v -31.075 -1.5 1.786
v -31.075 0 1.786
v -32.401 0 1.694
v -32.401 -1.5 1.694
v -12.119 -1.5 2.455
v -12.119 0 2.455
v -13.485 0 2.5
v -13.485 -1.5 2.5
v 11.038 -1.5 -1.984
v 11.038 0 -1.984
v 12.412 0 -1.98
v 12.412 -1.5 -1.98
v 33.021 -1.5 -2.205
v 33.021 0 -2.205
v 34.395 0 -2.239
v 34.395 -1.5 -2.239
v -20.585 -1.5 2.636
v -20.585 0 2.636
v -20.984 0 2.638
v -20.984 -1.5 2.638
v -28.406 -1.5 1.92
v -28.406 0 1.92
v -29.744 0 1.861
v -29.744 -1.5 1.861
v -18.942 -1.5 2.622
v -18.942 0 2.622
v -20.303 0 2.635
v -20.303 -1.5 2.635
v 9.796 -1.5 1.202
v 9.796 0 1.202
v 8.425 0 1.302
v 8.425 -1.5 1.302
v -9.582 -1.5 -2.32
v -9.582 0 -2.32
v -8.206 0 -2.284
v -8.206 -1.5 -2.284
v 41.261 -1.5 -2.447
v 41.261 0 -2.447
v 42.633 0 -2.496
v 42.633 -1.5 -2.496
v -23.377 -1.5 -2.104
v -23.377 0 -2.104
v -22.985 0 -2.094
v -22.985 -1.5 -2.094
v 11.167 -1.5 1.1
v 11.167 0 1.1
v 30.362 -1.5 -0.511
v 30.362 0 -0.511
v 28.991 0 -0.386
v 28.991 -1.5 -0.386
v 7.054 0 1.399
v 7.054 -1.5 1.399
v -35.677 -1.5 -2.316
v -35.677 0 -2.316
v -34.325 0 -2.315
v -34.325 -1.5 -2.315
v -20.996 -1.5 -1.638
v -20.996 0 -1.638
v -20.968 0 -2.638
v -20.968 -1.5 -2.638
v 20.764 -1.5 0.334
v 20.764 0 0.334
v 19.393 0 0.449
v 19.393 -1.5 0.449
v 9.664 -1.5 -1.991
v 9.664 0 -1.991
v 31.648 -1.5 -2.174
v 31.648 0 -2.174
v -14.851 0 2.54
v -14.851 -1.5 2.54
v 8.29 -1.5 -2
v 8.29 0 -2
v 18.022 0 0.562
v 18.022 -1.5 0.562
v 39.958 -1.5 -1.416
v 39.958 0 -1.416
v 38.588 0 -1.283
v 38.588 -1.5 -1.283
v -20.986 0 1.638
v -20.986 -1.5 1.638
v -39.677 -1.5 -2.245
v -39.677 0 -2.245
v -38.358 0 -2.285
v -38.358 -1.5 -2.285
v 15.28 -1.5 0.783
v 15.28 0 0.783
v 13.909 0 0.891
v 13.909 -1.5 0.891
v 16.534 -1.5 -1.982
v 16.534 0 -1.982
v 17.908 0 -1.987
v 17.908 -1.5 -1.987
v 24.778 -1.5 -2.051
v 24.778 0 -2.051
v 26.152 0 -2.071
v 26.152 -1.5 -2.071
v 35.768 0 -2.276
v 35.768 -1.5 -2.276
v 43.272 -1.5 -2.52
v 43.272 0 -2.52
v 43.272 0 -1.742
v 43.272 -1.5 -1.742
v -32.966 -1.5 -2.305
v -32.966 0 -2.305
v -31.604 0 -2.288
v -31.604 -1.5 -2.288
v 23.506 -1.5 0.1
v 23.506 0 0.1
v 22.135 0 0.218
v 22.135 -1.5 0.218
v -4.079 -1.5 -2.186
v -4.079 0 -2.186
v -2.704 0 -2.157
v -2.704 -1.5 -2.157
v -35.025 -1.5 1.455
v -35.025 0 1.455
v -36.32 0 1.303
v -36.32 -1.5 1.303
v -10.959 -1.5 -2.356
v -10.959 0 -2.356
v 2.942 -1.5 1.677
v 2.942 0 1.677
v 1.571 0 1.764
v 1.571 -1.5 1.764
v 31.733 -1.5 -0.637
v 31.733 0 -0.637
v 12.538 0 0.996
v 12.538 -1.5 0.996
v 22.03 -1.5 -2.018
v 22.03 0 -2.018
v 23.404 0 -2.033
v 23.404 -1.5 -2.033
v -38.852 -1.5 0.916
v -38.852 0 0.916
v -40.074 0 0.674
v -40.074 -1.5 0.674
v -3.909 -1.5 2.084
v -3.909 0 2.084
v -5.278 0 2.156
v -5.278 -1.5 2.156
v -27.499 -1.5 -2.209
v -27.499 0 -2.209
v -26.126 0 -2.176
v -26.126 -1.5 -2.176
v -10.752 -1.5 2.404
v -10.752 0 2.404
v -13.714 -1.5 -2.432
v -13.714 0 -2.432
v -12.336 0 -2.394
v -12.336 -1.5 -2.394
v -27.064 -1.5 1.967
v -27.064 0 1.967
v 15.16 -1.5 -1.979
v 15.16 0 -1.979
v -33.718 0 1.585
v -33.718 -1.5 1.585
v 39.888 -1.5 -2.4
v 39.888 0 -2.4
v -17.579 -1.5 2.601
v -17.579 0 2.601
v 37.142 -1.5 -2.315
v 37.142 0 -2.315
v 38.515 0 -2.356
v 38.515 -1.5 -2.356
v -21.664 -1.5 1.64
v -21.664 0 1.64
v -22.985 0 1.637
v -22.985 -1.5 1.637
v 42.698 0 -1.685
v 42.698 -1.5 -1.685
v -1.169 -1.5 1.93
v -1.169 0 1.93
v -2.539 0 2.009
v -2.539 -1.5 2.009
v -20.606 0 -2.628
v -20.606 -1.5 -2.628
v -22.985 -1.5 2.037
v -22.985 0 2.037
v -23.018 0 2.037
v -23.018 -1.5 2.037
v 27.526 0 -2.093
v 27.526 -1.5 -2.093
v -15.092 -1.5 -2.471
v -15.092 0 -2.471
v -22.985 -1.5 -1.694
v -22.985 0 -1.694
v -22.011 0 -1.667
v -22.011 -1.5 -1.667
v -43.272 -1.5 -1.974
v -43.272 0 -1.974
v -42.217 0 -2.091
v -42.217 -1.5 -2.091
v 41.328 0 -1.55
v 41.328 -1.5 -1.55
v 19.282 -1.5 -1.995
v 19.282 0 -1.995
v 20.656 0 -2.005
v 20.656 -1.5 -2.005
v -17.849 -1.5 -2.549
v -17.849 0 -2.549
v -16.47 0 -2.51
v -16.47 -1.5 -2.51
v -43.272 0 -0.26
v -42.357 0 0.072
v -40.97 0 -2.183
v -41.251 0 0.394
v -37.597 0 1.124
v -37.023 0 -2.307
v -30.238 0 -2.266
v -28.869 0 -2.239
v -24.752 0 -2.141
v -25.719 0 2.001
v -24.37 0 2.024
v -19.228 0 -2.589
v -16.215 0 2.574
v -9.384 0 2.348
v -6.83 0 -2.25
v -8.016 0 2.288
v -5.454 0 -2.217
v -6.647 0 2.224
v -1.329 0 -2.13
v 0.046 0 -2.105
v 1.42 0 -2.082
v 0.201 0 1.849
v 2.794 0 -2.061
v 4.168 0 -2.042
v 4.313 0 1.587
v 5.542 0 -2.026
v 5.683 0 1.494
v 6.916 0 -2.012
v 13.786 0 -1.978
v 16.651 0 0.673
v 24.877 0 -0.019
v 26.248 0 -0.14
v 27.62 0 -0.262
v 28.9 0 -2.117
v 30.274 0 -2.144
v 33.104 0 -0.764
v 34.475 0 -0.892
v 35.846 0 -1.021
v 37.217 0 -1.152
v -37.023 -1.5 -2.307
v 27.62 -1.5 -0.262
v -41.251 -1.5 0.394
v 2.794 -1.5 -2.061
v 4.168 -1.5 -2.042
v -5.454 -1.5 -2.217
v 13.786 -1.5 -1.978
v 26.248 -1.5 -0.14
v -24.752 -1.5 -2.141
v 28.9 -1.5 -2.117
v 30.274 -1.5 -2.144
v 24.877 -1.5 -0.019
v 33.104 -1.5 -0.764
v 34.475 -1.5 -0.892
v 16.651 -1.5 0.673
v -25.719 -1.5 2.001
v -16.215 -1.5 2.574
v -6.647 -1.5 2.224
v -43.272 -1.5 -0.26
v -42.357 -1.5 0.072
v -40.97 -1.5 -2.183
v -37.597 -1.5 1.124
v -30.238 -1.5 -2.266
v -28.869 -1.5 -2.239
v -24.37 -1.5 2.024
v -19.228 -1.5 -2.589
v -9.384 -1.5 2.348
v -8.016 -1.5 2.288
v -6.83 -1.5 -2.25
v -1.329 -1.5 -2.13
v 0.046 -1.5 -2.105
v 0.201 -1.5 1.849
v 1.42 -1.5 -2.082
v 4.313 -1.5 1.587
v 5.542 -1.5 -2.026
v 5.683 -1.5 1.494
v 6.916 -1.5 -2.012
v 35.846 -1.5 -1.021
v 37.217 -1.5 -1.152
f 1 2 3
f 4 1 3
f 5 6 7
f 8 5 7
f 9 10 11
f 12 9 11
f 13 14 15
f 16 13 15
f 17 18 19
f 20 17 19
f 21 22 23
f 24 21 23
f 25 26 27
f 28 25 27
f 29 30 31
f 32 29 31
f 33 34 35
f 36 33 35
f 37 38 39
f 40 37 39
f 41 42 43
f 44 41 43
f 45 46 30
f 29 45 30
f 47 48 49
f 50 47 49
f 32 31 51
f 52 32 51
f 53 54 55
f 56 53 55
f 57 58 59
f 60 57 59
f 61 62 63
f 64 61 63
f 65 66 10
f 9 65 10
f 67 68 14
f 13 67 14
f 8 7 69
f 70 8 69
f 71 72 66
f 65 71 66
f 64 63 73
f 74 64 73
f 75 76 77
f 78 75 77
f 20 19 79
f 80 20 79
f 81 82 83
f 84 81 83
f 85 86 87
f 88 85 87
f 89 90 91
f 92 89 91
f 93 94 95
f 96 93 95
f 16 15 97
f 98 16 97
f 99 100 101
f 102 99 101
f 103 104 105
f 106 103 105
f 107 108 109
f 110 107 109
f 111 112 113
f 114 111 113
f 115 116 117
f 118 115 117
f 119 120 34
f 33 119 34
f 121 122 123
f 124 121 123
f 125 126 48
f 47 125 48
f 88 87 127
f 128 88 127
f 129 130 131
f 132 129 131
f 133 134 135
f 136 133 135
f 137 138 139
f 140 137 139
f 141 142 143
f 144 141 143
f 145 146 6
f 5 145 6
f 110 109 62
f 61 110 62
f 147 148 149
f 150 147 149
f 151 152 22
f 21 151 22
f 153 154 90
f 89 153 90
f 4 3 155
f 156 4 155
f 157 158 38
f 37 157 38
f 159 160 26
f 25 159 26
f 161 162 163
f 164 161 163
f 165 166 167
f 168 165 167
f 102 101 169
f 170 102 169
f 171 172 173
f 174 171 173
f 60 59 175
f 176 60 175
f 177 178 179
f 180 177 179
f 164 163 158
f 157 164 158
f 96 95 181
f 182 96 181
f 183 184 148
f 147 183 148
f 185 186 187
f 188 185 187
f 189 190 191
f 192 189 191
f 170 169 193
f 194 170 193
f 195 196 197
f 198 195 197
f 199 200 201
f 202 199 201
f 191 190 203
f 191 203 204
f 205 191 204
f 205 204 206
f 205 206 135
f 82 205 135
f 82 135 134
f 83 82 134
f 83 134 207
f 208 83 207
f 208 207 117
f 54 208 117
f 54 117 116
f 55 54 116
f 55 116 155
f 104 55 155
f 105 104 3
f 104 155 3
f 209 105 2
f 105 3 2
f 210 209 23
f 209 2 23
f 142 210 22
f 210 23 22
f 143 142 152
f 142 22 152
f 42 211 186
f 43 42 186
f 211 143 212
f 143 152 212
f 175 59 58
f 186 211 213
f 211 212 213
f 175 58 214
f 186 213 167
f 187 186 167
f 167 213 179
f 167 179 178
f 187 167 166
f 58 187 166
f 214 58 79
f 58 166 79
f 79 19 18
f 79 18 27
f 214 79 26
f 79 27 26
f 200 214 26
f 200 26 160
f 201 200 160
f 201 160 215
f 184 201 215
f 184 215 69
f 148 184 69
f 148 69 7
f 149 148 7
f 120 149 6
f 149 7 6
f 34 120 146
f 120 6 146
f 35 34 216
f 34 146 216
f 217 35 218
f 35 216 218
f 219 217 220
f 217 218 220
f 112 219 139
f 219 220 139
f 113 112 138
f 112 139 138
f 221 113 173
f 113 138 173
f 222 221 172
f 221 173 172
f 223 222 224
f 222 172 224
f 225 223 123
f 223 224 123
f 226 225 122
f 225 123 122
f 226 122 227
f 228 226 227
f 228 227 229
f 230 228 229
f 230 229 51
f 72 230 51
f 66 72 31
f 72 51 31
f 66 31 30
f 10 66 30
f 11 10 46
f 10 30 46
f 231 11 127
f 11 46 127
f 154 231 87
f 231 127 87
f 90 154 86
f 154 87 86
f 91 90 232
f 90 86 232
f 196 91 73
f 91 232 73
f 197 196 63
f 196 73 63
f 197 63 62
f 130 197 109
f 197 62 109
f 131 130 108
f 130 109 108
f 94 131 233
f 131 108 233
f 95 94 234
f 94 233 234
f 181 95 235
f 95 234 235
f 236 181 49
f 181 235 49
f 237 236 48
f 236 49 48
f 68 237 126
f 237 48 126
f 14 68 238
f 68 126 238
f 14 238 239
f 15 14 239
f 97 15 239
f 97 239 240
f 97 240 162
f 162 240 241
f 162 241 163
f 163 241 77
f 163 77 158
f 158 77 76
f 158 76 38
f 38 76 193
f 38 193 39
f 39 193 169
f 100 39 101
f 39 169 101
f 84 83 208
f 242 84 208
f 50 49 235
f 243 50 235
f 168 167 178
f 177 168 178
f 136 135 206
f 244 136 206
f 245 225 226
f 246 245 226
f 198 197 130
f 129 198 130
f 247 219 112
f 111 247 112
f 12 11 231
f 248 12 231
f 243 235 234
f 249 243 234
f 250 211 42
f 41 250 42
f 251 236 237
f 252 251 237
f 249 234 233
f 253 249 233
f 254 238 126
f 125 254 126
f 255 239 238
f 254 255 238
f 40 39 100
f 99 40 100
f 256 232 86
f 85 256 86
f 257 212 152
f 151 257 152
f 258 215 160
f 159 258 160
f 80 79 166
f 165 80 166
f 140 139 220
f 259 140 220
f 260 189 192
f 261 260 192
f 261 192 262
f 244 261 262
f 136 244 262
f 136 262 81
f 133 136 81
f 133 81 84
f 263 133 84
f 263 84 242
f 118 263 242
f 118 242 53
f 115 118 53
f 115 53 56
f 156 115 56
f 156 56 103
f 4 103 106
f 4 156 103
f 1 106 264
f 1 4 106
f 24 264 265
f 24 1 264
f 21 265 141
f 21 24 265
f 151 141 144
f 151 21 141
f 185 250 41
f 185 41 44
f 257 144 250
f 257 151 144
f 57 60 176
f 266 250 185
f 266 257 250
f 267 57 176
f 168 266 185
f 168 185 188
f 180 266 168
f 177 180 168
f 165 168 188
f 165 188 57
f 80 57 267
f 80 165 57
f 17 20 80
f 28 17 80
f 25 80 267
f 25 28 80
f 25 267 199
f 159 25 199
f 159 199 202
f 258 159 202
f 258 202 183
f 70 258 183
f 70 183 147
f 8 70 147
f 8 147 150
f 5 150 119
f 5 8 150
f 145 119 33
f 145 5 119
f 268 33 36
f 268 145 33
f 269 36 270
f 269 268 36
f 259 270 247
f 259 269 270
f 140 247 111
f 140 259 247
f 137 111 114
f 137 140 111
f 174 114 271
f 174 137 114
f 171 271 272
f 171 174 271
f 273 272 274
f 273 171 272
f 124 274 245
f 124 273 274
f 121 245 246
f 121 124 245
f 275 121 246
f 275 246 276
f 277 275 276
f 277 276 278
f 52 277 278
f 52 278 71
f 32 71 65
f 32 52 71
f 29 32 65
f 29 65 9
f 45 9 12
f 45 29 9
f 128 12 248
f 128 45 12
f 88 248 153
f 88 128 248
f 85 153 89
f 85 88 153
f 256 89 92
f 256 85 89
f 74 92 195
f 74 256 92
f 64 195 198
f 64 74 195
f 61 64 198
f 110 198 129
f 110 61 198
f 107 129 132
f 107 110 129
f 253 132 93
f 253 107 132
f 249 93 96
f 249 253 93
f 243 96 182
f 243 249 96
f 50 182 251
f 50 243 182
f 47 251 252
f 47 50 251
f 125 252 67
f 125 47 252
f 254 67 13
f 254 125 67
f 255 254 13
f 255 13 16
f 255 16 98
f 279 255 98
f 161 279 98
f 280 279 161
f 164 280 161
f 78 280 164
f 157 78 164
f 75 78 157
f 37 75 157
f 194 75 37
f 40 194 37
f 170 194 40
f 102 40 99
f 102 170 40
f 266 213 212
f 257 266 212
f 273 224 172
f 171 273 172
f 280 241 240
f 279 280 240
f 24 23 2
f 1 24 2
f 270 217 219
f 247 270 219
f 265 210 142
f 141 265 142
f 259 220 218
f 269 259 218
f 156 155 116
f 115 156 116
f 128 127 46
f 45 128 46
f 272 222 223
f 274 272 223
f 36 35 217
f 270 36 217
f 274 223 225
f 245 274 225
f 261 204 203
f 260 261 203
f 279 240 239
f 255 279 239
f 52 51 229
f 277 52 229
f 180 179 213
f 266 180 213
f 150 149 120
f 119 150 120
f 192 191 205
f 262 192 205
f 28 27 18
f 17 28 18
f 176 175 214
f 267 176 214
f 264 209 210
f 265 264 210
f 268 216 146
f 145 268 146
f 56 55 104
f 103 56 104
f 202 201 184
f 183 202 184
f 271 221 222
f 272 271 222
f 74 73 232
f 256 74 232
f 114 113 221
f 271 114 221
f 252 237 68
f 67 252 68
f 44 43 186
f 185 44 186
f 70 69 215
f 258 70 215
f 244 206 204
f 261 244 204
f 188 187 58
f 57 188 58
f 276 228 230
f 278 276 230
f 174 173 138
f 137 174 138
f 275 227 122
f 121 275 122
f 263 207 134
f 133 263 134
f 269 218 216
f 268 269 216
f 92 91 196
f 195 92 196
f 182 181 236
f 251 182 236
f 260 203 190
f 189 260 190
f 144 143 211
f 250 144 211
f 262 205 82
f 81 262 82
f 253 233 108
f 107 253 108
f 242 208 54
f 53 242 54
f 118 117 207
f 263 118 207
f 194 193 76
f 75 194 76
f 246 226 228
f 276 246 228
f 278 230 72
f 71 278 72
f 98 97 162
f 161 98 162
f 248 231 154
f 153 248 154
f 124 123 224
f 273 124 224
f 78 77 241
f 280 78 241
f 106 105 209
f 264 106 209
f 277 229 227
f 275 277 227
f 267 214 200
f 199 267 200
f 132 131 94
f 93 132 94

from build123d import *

# Parameters (mm, degrees)
F1_DEPTH = 1.5


with BuildPart() as f1:
    # F0 (on Front) → F1 (new body)
    with BuildSketch(Plane.XZ):
        Polygon((42.633343, -2.49563), (43.272484, -2.519707), (43.272484, -1.742308), (42.69796, -1.684938), (41.328284, -1.549762), (39.958285, -1.415982), (38.587682, -1.283293), (37.217047, -1.151804), (35.8462, -1.021412), (34.47504, -0.892116), (33.104072, -0.763823), (31.732882, -0.636727), (30.361783, -0.510732), (28.990562, -0.385836), (27.61952, -0.262443), (26.248371, -0.140148), (24.877293, -0.019353), (23.506195, 0.10004), (22.135176, 0.217934), (20.764144, 0.334327), (19.39309, 0.44902), (18.022108, 0.562112), (16.650999, 0.673405), (15.279969, 0.782998), (13.909014, 0.890788), (12.537939, 0.996481), (11.166931, 1.100372), (9.795887, 1.201963), (8.425023, 1.301653), (7.05413, 1.398942), (5.683203, 1.494032), (4.312542, 1.586517), (2.941846, 1.676703), (1.571408, 1.764085), (0.200941, 1.848667), (-1.16917, 1.930444), (-2.539126, 2.008918), (-3.908919, 2.08429), (-5.278373, 2.156057), (-6.647362, 2.224318), (-8.016013, 2.288373), (-9.384124, 2.34842), (-10.751789, 2.403962), (-12.118831, 2.454594), (-13.485133, 2.500115), (-14.850716, 2.539926), (-16.215481, 2.573926), (-17.579134, 2.601408), (-18.941783, 2.622078), (-20.303227, 2.63533), (-20.584685, 2.636391), (-20.983679, 2.637896), (-20.986194, 1.637899), (-21.663723, 1.640454), (-22.984685, 1.637154), (-22.984685, 2.037155), (-23.017754, 2.037072), (-24.3697, 2.024193), (-25.718667, 2.001218), (-27.064375, 1.966956), (-28.406277, 1.920413), (-29.743588, 1.860604), (-31.075309, 1.785746), (-32.400583, 1.694354), (-33.718012, 1.584864), (-35.025475, 1.45502), (-36.320133, 1.302504), (-37.597337, 1.124029), (-38.85176, 0.91599), (-40.074441, 0.67423), (-41.250641, 0.394269), (-42.357252, 0.072427), (-43.272483, -0.259564), (-43.272483, -1.973716), (-42.217361, -2.090856), (-40.969827, -2.182832), (-39.676941, -2.245), (-38.357821, -2.284522), (-37.022666, -2.306992), (-35.677446, -2.316059), (-34.324731, -2.314553), (-32.96632, -2.304531), (-31.603709, -2.287765), (-30.237914, -2.265637), (-28.869339, -2.23904), (-27.49865, -2.208962), (-26.126236, -2.1761), (-24.752033, -2.141054), (-23.376672, -2.104415), (-22.984685, -2.093671), (-22.984685, -1.693521), (-22.011267, -1.66684), (-20.995926, -1.638295), (-20.967824, -2.637901), (-20.605853, -2.627724), (-19.227691, -2.5887), (-17.848918, -2.549284), (-16.470151, -2.509968), (-15.091682, -2.470748), (-13.713622, -2.432022), (-12.336069, -2.39379), (-10.958819, -2.356253), (-9.581993, -2.319811), (-8.205572, -2.284264), (-6.829578, -2.25011), (-5.453898, -2.217453), (-4.078642, -2.186389), (-2.703715, -2.157122), (-1.329006, -2.129952), (0.04557, -2.10458), (1.420015, -2.081506), (2.794232, -2.06063), (4.168418, -2.042053), (5.542473, -2.025775), (6.916498, -2.011696), (8.290479, -2.000218), (9.664437, -1.991039), (11.038461, -1.984261), (12.412351, -1.979982), (13.786304, -1.978103), (15.160229, -1.978625), (16.534212, -1.981747), (17.908073, -1.987169), (19.28209, -1.995092), (20.656078, -2.005415), (22.030035, -2.018038), (23.404062, -2.033263), (24.777953, -2.050686), (26.15201, -2.070511), (27.525934, -2.092734), (28.899833, -2.117358), (30.273694, -2.144181), (31.64752, -2.173504), (33.021118, -2.205124), (34.394681, -2.239244), (35.768113, -2.275662), (37.141517, -2.31468), (38.514666, -2.356195), (39.887705, -2.400108), (41.260595, -2.44662), align=None)
    extrude(amount=F1_DEPTH)


solid = f1.part
